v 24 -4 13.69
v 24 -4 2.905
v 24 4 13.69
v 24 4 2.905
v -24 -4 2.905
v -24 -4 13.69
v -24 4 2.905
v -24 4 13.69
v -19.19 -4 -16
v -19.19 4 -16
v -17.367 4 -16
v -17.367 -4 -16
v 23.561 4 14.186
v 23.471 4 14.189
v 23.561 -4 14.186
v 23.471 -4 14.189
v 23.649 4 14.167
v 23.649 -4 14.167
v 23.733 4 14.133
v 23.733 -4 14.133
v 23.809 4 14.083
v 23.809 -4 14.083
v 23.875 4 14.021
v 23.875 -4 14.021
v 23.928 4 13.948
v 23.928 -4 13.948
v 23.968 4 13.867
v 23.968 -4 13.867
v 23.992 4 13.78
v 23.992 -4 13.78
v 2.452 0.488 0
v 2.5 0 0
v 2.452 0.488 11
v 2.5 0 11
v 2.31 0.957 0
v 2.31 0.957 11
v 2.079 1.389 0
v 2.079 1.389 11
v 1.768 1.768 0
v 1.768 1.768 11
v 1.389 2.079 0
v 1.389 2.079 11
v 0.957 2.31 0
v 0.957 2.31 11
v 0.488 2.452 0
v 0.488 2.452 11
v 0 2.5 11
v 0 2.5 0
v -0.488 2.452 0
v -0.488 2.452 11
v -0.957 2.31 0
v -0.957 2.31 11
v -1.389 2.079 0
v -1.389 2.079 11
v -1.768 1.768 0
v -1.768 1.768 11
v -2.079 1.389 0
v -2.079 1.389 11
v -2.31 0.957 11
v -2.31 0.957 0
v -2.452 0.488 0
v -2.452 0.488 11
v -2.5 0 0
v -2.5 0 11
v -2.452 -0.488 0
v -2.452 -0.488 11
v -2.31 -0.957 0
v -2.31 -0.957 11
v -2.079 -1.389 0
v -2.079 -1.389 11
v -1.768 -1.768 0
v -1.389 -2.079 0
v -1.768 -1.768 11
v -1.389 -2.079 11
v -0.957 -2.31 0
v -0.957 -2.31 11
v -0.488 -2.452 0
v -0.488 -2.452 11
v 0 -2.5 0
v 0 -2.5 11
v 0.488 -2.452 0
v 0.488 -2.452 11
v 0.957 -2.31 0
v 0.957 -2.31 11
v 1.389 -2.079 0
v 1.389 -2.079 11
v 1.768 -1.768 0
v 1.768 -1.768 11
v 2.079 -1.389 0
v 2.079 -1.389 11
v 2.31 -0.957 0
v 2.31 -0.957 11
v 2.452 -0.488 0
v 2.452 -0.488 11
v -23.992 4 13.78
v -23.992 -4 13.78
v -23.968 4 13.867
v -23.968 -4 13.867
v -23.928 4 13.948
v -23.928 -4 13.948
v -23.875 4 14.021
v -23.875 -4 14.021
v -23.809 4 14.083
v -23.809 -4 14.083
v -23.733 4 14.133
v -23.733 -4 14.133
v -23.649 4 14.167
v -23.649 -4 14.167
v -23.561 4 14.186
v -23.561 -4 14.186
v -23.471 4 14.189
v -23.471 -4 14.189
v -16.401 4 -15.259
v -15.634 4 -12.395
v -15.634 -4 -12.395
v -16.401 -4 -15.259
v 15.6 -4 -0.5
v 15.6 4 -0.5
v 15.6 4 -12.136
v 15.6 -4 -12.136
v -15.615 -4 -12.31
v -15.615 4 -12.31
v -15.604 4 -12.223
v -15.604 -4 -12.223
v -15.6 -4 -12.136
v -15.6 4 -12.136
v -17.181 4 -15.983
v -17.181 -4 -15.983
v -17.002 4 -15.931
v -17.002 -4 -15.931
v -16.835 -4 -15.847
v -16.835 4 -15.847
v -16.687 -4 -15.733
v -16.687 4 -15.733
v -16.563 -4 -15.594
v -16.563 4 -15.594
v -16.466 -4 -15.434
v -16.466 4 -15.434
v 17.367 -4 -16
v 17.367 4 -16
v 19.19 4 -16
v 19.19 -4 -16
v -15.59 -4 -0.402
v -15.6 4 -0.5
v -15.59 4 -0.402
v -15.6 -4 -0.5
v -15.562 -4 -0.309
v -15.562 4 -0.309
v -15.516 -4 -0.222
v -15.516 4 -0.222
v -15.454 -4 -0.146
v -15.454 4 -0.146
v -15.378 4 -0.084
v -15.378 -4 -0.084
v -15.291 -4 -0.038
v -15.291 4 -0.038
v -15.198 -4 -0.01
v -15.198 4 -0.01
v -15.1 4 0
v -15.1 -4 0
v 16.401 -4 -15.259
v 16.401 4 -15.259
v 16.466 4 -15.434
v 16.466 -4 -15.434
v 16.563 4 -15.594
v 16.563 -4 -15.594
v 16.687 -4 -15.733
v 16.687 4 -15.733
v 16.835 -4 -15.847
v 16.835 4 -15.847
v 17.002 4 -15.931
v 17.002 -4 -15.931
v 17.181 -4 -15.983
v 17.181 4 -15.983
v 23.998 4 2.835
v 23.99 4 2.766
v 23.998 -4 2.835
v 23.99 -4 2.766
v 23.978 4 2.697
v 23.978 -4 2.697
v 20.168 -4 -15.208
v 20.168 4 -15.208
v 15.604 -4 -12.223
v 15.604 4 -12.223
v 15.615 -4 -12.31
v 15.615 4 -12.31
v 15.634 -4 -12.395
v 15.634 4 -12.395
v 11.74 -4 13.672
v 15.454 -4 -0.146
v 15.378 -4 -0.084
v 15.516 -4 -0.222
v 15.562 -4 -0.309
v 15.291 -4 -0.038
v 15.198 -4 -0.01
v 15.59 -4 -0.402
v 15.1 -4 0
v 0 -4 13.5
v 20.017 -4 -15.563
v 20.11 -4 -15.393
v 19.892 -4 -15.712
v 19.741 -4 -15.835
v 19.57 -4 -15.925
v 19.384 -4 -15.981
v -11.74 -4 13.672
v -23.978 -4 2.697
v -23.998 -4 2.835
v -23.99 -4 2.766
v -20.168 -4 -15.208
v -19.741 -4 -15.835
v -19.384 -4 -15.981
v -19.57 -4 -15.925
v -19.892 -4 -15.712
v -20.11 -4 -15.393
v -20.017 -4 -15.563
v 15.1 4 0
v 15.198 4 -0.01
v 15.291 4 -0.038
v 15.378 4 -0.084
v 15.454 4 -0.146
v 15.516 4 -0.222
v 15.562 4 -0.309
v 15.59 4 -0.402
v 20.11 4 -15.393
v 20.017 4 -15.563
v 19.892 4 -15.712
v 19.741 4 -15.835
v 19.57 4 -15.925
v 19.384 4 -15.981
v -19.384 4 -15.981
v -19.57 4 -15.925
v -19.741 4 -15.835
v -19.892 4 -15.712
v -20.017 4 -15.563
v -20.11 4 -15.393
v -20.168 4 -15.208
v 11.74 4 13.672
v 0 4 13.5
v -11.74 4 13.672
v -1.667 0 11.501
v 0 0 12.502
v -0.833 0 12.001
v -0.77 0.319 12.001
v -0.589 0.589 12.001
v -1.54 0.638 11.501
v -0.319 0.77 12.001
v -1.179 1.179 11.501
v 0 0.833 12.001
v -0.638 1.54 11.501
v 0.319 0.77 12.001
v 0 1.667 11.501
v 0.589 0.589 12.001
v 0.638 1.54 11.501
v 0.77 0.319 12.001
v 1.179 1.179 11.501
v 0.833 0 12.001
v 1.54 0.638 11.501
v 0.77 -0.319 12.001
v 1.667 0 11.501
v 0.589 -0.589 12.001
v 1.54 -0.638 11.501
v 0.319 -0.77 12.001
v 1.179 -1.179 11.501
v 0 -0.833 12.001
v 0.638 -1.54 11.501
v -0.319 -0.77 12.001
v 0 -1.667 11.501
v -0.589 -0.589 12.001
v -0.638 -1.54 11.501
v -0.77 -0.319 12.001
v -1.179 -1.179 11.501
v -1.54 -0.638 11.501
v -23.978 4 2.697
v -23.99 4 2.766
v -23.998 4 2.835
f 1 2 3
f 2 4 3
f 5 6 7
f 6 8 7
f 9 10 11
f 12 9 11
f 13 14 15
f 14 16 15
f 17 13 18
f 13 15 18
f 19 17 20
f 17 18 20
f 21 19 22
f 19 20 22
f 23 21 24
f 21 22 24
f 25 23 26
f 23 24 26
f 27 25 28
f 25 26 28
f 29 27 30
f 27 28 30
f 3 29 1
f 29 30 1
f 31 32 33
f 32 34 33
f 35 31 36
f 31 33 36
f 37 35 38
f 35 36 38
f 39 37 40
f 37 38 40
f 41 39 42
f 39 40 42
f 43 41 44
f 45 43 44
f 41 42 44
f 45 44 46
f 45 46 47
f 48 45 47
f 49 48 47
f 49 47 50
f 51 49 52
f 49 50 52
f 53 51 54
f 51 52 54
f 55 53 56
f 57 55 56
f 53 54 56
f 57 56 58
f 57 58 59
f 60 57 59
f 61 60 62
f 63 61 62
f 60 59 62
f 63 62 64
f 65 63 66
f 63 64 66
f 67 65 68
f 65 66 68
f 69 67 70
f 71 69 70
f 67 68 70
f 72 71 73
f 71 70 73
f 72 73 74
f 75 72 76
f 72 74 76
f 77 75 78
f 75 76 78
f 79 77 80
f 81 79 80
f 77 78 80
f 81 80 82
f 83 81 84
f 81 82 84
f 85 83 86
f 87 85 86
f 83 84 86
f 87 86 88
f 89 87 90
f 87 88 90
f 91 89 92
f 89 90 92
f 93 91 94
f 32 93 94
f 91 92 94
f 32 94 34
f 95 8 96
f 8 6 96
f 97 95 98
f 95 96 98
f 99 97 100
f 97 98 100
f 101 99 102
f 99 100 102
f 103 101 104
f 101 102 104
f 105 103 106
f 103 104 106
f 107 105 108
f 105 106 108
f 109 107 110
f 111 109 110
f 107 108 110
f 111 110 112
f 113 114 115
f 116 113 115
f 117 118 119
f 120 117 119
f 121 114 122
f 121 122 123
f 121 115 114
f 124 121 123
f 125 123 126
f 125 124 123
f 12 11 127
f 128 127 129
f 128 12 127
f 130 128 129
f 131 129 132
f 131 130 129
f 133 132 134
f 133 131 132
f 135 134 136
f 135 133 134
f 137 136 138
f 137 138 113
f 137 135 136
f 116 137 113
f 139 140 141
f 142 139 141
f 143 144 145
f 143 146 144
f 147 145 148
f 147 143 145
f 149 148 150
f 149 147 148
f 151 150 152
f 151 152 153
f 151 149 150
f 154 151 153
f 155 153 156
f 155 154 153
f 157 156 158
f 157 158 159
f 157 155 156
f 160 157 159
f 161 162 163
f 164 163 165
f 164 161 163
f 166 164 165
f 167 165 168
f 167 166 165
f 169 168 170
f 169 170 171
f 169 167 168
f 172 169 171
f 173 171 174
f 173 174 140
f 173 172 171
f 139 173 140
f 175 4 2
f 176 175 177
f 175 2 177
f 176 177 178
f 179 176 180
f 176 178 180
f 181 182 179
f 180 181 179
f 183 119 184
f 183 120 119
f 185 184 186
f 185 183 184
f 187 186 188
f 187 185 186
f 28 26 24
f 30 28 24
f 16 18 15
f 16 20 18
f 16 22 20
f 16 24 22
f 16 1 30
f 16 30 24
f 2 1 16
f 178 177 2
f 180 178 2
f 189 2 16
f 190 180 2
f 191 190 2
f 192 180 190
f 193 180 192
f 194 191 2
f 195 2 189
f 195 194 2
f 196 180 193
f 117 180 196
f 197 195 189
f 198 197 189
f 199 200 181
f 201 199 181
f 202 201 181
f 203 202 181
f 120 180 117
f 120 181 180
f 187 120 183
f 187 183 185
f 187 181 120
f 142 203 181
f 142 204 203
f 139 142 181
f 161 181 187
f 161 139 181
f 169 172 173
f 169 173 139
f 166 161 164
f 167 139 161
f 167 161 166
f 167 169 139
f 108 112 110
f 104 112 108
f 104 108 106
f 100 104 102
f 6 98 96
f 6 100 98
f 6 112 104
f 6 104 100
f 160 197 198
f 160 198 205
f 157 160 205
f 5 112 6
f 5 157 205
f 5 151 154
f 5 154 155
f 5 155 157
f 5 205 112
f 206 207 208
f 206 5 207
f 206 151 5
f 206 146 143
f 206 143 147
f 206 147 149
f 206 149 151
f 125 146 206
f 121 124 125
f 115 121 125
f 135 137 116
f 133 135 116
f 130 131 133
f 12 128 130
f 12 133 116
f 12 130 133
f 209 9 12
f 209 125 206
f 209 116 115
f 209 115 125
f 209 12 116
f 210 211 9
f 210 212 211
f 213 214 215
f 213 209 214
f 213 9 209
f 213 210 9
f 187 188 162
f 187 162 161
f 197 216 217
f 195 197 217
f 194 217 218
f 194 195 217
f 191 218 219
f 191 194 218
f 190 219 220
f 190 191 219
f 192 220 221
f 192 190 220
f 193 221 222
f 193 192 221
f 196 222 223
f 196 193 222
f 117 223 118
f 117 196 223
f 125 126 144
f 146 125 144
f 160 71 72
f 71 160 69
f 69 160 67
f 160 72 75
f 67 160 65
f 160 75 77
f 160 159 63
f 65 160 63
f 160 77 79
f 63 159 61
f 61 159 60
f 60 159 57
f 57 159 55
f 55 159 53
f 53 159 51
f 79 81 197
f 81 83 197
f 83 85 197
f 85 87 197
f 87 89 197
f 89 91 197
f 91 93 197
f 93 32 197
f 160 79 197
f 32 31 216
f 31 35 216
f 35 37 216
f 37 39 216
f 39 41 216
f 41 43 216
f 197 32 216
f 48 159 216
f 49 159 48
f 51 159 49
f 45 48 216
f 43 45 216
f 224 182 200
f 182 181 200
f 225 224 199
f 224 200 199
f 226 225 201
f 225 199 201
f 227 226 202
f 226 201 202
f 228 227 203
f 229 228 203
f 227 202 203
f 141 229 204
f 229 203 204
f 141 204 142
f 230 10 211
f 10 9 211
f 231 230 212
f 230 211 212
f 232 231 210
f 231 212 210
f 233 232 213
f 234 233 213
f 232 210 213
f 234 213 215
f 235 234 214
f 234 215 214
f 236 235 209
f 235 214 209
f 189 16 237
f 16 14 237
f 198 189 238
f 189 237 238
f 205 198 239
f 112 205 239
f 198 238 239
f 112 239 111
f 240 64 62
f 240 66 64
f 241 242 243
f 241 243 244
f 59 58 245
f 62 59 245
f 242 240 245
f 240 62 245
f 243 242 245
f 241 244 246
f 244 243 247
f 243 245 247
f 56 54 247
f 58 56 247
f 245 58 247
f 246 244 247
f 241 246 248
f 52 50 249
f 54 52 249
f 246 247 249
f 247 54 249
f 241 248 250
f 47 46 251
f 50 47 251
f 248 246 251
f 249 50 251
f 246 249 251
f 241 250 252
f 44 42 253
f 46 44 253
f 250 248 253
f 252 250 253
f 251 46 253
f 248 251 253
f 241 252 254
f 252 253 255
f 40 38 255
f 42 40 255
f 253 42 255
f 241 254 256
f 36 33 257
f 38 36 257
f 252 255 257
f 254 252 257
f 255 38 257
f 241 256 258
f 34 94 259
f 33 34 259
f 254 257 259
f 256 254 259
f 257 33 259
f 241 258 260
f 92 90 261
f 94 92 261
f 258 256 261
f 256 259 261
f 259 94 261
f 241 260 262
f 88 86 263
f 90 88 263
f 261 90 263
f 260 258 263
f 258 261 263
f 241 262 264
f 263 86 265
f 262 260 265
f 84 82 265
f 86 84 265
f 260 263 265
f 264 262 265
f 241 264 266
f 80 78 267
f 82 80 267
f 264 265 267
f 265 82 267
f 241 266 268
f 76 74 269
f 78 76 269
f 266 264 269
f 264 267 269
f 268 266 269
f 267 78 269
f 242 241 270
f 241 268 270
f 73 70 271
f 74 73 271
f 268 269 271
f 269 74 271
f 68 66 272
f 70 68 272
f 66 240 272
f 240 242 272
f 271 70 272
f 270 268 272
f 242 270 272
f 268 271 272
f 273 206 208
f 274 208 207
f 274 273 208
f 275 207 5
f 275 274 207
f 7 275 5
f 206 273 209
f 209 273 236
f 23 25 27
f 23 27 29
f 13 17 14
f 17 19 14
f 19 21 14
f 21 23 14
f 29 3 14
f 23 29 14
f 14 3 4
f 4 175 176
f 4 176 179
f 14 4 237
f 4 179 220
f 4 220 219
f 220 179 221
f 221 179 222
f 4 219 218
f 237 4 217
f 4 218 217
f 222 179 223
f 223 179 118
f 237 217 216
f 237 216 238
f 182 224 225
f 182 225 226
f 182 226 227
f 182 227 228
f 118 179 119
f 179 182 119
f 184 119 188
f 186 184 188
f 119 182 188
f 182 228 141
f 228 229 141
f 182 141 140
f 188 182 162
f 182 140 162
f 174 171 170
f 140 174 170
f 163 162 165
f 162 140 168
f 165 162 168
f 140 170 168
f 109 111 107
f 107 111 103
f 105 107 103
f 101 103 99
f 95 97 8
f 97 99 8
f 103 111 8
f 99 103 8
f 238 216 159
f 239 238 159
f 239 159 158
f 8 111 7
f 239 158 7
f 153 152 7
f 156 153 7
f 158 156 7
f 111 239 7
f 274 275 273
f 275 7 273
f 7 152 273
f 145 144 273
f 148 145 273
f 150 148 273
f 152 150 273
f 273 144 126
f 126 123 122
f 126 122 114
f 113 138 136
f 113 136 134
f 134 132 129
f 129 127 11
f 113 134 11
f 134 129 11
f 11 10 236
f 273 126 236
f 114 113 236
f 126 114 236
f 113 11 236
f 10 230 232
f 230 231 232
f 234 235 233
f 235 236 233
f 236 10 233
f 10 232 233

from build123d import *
from OCP.BRepFilletAPI import BRepFilletAPI_MakeChamfer

# Parameters (mm, degrees)
BOSS_EXTRUDE1_DEPTH       = 4
BOSS_EXTRUDE2_DEPTH       = 8
M6X1_0_TAPPED_HOLE1_D     = 5
M6X1_0_TAPPED_HOLE1_DEPTH = 11
M6X1_0_TAPPED_HOLE1_TIP   = 1.502151548
CHAMFER1_SIZE             = 1
CHAMFER1_SIZE2            = 3.732050808
FILLET1_R                 = 1
FILLET2_R                 = 0.5


with BuildPart() as part:
    # Sketch1 → Boss-Extrude1 (new, symmetric)
    with BuildSketch(Plane(origin=(0, 0, 0), x_dir=(1, 0, 0), z_dir=(0, 1, 0))):
        with BuildLine():
            Line((-20, 0), (0, 0))
            Line((0, 0), (20, 0))
            Line((20, 0), (20, -2.8))
            Line((20, -2.8), (24, -2.8))
            Line((24, -2.8), (24, -14.220649169))
            ThreePointArc((24, -14.220649169), (0, -13.5), (-24, -14.220649169))
            Line((-24, -14.220649169), (-24, -2.8))
            Line((-24, -2.8), (-20, -2.8))
            Line((-20, -2.8), (-20, 0))
        make_face()
    extrude(amount=BOSS_EXTRUDE1_DEPTH, both=True)

    # Sketch5 → Boss-Extrude2 (add)
    with BuildSketch(Plane(origin=(0, 4, 0), x_dir=(1, 0, 0), z_dir=(0, 1, 0))):
        Polygon((-20, 16), (-15.6, 16), (-15.6, 0), (-20, 0), (-20, -2.8), (-24, -2.8), align=None)
        Polygon((20, -2.8), (20, 0), (15.6, 0), (15.6, 16), (20, 16), (24, -2.8), align=None)
    extrude(amount=-BOSS_EXTRUDE2_DEPTH)

    # M6x1.0 Tapped Hole1
    with Locations(Plane(origin=(0, 0, 0), x_dir=(-1, 0, 0), z_dir=(0, 0, -1))):
        with Locations((0, 0)):
            Hole(M6X1_0_TAPPED_HOLE1_D / 2, depth=M6X1_0_TAPPED_HOLE1_DEPTH)
            with Locations((0, 0, -(M6X1_0_TAPPED_HOLE1_DEPTH + M6X1_0_TAPPED_HOLE1_TIP / 2))):  # 118° drill point
                Cone(0, M6X1_0_TAPPED_HOLE1_D / 2, M6X1_0_TAPPED_HOLE1_TIP, mode=Mode.SUBTRACT)

    # Chamfer1: one chamfer whose edges measure the first distance from different faces: ONE call of the kernel's chamfer builder (chamfer() names one face for all edges)
    chamfer1_edges_1 = [part.edges().sort_by_distance(p)[0] for p in [
        (-15.6, 0, -16),
    ]]
    chamfer1_side_1 = [part.faces().sort_by_distance(p)[0] for p in [
        (-17.8, 0, -16),
    ]]
    chamfer1_edges_2 = [part.edges().sort_by_distance(p)[0] for p in [
        (15.6, 0, -16),
    ]]
    chamfer1_side_2 = [part.faces().sort_by_distance(p)[0] for p in [
        (17.8, 0, -16),
    ]]
    chamfer1 = BRepFilletAPI_MakeChamfer(part.part.solid().wrapped)
    for e in chamfer1_edges_1:
        chamfer1.Add(CHAMFER1_SIZE, CHAMFER1_SIZE2, e.wrapped, chamfer1_side_1[0].wrapped)  # the first distance lies on this face
    for e in chamfer1_edges_2:
        chamfer1.Add(CHAMFER1_SIZE, CHAMFER1_SIZE2, e.wrapped, chamfer1_side_2[0].wrapped)  # the first distance lies on this face
    add(Compound.cast(chamfer1.Shape()), mode=Mode.REPLACE)

    # Fillet1
    fillet1_edges = [part.edges().sort_by_distance(p)[0] for p in [
        (24, 0, 2.8),
        (-24, 0, 2.8),
        (-20, 0, -16),
        (20, 0, -16),
        (16.6, 0, -16),
        (15.6, 0, -12.267949192),
        (-15.6, 0, -12.267949192),
        (-16.6, 0, -16),
    ]]
    fillet(fillet1_edges, radius=FILLET1_R)

    # Fillet2
    fillet2_edges = [part.edges().sort_by_distance(p)[0] for p in [
        (24, 0, 14.220649169),
        (-24, 0, 14.220649169),
        (-15.6, 0, 0),
        (15.6, 0, 0),
    ]]
    fillet(fillet2_edges, radius=FILLET2_R)


solid = part.part
